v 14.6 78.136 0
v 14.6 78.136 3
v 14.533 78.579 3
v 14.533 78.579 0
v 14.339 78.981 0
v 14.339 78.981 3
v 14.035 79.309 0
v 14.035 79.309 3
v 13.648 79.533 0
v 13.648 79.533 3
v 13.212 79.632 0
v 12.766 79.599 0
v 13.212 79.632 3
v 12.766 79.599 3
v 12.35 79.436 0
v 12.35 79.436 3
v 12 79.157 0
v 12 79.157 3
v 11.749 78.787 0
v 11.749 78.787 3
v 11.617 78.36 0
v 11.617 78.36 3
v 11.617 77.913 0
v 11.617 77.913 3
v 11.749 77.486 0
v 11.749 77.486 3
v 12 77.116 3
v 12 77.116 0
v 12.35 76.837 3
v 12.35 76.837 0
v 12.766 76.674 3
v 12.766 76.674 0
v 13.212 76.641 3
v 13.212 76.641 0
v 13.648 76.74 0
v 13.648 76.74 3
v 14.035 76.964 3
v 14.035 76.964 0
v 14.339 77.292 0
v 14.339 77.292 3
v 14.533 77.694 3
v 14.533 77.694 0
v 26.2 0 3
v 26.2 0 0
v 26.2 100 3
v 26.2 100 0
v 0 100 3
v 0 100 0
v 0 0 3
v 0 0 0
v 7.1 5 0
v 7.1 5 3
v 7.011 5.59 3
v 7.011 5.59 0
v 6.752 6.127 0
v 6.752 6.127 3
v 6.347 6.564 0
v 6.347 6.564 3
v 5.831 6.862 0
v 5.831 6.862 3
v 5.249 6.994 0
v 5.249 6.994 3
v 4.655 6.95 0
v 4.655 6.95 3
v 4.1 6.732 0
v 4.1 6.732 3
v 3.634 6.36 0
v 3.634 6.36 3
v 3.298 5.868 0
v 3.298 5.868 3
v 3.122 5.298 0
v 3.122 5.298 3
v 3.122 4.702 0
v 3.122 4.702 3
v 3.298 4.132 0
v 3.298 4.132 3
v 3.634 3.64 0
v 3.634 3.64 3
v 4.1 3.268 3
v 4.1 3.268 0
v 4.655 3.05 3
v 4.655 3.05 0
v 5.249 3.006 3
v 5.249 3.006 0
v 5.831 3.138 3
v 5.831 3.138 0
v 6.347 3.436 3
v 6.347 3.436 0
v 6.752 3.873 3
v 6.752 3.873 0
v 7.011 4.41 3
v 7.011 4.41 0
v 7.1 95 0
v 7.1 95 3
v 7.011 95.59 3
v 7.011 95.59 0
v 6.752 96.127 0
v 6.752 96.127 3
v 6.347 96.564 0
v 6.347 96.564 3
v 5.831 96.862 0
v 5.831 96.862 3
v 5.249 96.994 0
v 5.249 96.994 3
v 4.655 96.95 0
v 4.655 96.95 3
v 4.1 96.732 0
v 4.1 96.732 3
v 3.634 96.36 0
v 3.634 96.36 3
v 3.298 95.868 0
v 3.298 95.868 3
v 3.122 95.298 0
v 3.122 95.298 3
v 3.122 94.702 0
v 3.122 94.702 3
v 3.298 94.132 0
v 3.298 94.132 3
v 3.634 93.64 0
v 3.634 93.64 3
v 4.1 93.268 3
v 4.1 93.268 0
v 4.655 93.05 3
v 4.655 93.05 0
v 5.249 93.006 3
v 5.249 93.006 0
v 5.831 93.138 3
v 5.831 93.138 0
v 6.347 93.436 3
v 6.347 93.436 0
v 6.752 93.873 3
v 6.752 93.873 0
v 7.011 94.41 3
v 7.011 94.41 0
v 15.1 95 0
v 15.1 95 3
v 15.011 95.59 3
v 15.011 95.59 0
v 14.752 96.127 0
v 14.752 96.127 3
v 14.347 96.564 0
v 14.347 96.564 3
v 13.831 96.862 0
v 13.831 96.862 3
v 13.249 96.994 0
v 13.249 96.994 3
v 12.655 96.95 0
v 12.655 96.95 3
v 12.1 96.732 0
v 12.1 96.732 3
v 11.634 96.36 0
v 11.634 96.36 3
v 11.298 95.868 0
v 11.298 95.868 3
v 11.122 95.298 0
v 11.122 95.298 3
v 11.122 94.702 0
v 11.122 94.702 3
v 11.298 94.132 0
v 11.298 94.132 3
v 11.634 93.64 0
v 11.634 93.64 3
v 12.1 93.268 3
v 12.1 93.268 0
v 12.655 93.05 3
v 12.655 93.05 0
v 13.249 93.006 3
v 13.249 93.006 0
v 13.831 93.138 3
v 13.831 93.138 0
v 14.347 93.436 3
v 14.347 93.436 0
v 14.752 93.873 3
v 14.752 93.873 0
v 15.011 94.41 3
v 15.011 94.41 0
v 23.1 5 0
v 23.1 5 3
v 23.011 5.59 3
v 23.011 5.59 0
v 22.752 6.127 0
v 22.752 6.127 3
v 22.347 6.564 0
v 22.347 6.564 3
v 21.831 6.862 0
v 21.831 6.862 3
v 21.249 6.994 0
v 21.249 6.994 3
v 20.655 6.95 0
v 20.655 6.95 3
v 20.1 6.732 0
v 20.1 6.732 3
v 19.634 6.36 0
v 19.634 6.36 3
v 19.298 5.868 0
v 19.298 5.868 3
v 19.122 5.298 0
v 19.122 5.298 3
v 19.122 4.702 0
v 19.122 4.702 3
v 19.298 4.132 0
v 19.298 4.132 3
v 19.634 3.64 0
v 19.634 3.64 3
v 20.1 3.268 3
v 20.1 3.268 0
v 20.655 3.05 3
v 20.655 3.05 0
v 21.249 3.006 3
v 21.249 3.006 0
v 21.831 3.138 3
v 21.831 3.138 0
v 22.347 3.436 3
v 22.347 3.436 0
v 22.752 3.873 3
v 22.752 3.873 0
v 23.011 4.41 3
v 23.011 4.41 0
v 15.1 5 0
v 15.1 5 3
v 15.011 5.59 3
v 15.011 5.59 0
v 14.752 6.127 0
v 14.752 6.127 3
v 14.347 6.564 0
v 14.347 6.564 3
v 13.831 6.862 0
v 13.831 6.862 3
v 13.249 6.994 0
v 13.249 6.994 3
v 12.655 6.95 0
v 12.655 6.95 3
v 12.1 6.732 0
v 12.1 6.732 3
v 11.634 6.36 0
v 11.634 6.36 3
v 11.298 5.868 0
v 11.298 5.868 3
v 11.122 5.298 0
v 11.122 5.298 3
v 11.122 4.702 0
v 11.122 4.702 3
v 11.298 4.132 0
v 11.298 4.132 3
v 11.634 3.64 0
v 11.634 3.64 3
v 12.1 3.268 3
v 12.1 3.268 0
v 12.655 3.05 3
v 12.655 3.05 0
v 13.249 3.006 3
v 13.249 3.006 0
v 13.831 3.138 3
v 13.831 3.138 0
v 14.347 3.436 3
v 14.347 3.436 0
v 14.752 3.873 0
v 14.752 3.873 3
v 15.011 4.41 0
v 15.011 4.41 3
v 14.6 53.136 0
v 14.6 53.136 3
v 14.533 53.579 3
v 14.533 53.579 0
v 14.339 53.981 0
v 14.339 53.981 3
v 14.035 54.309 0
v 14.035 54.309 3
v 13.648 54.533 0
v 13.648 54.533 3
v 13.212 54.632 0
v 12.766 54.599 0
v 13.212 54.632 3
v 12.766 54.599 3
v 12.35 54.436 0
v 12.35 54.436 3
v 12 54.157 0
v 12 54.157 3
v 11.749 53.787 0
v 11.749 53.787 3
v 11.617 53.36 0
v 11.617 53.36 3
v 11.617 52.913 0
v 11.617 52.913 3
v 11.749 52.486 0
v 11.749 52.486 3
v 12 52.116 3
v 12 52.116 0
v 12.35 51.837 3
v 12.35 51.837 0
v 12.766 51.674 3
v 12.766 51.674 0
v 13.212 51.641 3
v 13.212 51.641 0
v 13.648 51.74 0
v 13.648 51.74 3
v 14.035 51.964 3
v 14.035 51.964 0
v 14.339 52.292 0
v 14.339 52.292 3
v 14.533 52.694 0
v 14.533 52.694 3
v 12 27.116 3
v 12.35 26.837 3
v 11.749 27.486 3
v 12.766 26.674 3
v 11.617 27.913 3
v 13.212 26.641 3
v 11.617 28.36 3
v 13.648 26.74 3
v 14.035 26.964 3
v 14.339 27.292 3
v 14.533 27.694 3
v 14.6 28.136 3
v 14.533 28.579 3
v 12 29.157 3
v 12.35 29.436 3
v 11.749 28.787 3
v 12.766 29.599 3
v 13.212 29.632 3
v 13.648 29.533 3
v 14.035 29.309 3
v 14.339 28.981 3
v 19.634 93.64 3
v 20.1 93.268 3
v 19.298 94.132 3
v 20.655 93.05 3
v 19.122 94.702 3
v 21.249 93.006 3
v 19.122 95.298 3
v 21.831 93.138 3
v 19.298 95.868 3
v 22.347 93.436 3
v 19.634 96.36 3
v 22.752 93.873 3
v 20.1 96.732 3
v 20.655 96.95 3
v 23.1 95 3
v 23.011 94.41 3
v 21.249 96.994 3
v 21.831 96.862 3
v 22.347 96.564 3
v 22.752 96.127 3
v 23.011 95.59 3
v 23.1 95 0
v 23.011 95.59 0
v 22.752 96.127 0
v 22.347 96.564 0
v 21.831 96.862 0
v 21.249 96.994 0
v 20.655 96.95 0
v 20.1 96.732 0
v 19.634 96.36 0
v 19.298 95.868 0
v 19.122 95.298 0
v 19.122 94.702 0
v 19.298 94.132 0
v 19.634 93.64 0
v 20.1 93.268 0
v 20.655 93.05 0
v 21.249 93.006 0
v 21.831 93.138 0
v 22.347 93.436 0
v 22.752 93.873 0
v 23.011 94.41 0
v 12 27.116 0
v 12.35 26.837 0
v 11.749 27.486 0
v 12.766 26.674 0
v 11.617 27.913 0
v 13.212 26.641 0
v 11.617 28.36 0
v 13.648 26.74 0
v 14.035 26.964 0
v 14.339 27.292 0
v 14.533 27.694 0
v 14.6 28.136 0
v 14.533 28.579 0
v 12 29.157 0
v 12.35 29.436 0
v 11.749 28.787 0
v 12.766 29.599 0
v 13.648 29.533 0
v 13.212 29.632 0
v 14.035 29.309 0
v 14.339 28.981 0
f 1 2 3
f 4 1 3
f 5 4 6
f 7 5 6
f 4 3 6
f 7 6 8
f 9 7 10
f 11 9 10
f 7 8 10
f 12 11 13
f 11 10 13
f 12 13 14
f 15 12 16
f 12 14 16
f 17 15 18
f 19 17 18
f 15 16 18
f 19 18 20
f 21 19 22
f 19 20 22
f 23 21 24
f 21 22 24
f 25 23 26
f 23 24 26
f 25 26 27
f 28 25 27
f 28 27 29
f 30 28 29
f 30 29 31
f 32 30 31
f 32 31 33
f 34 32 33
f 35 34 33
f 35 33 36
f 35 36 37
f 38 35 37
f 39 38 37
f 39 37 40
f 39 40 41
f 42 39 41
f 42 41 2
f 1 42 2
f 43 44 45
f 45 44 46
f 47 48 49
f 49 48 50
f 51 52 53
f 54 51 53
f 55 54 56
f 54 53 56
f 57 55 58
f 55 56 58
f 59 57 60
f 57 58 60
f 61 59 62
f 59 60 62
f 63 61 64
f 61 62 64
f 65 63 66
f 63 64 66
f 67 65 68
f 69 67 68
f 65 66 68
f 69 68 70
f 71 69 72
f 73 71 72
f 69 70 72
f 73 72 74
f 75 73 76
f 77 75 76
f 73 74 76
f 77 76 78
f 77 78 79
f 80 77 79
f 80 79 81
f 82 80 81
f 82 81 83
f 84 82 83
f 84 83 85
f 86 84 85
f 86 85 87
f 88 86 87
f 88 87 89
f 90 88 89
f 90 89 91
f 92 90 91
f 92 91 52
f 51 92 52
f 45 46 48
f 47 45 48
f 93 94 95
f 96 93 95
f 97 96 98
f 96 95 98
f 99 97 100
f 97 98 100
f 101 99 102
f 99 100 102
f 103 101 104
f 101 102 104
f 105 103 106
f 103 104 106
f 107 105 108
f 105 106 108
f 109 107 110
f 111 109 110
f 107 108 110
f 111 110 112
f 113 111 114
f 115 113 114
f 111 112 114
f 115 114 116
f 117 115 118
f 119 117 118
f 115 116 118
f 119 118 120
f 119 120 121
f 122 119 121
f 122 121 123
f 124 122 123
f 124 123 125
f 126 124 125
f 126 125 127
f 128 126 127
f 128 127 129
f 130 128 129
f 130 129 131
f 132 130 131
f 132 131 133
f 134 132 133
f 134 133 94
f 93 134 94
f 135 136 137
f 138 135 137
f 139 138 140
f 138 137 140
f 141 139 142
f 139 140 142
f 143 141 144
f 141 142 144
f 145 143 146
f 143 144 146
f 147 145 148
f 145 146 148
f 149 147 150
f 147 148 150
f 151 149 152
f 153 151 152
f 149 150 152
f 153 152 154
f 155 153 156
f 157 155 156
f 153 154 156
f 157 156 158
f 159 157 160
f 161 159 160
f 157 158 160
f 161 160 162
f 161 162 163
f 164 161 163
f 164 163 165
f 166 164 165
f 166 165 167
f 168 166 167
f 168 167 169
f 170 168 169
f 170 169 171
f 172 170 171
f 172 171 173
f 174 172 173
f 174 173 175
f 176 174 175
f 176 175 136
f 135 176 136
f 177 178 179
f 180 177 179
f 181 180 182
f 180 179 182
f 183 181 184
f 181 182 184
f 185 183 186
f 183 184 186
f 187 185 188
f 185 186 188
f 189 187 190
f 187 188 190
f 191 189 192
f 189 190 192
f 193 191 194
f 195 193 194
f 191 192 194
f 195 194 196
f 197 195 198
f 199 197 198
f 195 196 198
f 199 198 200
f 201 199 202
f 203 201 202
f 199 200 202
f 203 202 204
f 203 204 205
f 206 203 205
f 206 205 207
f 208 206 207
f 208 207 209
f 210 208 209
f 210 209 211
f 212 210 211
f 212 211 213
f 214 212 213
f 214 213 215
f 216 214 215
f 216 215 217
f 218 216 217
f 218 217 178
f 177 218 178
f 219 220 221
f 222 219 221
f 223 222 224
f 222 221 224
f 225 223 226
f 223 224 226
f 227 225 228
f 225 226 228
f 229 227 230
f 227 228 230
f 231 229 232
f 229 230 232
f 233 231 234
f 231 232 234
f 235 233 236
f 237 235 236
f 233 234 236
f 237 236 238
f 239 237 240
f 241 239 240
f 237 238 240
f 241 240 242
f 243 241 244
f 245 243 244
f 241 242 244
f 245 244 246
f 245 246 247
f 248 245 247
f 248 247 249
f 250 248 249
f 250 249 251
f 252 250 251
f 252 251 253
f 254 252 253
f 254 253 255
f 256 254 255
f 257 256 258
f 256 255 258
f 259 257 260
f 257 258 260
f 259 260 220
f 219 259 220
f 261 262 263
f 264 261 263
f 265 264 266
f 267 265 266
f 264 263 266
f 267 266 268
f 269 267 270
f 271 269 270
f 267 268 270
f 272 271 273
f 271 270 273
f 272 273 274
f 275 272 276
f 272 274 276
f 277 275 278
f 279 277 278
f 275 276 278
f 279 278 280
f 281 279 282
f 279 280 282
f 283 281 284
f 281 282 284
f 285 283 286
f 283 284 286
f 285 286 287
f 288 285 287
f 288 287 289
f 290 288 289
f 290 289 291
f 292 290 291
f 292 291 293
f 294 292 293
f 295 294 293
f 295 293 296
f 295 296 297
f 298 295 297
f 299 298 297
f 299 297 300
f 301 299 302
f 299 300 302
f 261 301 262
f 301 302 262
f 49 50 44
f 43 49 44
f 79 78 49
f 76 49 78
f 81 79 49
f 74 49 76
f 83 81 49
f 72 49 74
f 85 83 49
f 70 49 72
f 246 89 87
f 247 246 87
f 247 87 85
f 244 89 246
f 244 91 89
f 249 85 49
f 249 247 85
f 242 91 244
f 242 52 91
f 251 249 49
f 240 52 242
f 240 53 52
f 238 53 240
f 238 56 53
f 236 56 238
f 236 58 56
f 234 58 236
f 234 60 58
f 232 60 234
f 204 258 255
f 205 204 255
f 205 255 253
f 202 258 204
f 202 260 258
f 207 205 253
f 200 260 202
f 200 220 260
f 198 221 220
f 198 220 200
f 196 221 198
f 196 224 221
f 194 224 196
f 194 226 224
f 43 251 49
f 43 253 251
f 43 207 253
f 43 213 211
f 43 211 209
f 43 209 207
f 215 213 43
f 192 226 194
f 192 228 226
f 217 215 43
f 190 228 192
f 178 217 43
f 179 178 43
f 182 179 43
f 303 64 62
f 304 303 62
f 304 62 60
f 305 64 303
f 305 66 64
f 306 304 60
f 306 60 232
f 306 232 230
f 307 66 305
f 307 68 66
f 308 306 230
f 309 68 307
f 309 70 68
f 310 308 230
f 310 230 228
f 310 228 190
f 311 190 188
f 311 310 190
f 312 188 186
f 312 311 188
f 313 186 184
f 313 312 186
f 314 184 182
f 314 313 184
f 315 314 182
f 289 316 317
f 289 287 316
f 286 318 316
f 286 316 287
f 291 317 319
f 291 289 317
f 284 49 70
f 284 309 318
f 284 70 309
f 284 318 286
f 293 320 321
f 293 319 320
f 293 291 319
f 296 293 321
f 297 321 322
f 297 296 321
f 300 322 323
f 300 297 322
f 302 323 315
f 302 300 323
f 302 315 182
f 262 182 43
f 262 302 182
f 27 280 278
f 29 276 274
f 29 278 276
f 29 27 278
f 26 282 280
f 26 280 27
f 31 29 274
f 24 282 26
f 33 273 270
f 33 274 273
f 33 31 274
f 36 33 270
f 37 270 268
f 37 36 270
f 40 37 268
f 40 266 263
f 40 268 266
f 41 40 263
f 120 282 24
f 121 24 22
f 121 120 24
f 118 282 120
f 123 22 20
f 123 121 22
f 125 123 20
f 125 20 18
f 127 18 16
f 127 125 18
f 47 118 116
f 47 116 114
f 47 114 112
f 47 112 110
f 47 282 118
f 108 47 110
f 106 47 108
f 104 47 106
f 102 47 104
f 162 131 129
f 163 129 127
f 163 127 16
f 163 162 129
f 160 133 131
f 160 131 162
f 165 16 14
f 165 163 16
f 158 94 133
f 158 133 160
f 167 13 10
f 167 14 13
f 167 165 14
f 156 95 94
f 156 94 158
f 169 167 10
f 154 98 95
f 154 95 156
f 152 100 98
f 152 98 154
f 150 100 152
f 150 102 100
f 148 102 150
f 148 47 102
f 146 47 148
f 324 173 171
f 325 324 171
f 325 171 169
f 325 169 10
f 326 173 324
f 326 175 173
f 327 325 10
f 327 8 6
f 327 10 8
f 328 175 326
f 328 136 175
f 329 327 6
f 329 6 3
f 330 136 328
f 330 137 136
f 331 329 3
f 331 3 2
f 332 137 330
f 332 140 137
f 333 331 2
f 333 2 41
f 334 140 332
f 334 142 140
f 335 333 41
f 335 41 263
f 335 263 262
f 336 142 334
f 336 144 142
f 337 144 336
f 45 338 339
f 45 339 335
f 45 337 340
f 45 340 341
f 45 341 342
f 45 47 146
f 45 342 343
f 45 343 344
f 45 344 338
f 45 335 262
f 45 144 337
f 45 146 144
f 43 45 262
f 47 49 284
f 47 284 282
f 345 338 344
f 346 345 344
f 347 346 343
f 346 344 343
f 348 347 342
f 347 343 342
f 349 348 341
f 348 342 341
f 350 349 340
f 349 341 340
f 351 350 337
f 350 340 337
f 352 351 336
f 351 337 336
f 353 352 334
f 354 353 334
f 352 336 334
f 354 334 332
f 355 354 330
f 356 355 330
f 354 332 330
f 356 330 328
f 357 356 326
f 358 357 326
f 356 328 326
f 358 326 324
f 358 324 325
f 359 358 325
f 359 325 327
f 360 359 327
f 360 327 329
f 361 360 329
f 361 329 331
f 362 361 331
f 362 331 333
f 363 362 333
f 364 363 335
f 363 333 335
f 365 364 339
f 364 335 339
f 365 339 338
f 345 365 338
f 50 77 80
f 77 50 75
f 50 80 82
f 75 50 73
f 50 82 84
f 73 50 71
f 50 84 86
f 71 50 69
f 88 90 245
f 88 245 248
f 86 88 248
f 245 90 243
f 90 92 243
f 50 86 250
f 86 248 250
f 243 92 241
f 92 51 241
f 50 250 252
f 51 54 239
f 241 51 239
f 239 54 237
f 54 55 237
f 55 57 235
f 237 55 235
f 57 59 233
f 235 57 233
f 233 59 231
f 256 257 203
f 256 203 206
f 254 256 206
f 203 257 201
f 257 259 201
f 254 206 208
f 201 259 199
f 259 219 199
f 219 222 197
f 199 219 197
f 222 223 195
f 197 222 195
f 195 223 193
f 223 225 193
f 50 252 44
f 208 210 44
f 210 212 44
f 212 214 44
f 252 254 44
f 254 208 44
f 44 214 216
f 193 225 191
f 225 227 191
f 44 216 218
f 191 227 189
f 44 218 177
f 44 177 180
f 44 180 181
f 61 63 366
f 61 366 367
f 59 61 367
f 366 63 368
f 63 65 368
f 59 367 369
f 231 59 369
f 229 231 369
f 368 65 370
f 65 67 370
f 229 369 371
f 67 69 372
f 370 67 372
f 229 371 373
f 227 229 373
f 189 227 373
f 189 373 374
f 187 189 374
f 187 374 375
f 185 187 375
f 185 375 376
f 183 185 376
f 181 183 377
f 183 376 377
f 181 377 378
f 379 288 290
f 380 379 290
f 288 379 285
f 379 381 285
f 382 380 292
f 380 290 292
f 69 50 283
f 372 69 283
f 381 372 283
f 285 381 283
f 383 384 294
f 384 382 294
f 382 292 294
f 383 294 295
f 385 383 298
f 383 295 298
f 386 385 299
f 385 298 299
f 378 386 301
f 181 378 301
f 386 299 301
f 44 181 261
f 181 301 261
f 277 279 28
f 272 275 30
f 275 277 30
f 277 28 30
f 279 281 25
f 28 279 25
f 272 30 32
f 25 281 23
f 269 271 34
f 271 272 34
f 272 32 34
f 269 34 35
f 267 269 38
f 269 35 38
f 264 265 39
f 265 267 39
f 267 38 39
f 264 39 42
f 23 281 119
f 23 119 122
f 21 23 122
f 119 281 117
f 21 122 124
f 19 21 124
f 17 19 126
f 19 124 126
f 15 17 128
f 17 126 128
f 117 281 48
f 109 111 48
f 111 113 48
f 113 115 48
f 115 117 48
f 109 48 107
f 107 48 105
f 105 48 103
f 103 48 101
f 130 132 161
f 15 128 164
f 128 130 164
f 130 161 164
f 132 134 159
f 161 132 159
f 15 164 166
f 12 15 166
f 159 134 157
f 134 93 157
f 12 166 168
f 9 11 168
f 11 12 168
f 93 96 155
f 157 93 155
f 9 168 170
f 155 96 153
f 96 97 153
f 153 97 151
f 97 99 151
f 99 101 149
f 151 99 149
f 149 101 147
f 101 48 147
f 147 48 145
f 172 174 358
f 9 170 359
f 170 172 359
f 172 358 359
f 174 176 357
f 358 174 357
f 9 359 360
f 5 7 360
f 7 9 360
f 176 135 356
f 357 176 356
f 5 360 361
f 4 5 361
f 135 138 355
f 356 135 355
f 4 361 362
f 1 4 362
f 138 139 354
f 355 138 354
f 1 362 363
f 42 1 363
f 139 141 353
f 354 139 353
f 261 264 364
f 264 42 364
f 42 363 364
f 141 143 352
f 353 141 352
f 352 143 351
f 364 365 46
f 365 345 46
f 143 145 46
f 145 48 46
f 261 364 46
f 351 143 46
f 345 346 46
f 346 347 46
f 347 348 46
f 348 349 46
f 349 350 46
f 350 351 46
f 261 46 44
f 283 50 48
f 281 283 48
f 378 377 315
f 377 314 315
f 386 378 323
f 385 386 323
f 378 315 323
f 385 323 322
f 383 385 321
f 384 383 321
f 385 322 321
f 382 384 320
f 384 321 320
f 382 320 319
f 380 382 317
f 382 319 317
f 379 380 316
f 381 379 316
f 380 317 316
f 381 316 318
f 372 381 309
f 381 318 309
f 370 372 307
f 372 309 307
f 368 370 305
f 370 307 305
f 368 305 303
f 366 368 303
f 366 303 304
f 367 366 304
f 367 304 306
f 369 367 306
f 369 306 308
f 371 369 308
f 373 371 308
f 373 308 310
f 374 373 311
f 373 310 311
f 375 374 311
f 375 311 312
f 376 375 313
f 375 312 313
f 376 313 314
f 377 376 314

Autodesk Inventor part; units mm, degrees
ref_plane "YZ Plane" through (0, 0, 0) normal (1, 0, 0) x (0, 1, 0)
ref_plane "XZ Plane" through (0, 0, 0) normal (0, 1, 0) x (-1, 0, 0)
sketch "Эскиз1" plane through (0, 0, 0) normal (0, 0, 1) x (1, 0, 0)
  line L0 (0, 0) -> (26.2, 0)
  line L1 (26.2, 0) -> (26.2, 100)
  line L2 (26.2, 100) -> (0, 100)
  line L3 (0, 100) -> (0, 0)
  dimension "d0" = 26.2
  dimension "d1" = 100
extrude "Выдавливание1" add sketch "Эскиз1" along normal blind 3
sketch "Эскиз2" plane through (0, 0, 3) normal (0, 0, 1) x (1, 0, 0)
  line L0 (0, 0) -> (26.2, 0) projected
  line L1 (13.1, 0) -> (13.1, 5)
  circle A0 centre (13.1, 5) radius 2
  dimension "d4" = 5
  dimension "d5" = 4
extrude "Выдавливание2" cut sketch "Эскиз2" against normal blind 3
pattern_linear "Прямоуг.массив1" count 3 spacing 8 along (1, 0, 0) of "Выдавливание2" first direction both ways yes
sketch "Эскиз3" plane through (0, 0, 3) normal (0, 0, 1) x (1, 0, 0)
  line L0 (26.2, 0) -> (26.2, 100) projected
  line L1 (26.2, 28.1365) -> (26.2, 15.0365)
  line L2 (26.2, 28.1365) -> (13.1, 28.1365)
  circle A0 centre (13.1, 28.1365) radius 1.5
  point P0 (0, 0)
  dimension "d12" = 13.1
  dimension "d13" = 3
extrude "Выдавливание3" cut sketch "Эскиз3" against normal blind 3
pattern_linear "Прямоуг.массив2" count 3 spacing 25 along (0, 1, 0) of "Выдавливание3"
ref_plane "РабПлоскость1" through (26.2, 50, 3) normal (0, 1, 0) x (1, 0, 0)
mirror "Зеркальное отражение1" about plane through (26.2, 50, 3) normal (0, 1, 0) of "Выдавливание2", "Прямоуг.массив1"
properties part number "000.405 - Рычаг" material "Пластик АБС"
